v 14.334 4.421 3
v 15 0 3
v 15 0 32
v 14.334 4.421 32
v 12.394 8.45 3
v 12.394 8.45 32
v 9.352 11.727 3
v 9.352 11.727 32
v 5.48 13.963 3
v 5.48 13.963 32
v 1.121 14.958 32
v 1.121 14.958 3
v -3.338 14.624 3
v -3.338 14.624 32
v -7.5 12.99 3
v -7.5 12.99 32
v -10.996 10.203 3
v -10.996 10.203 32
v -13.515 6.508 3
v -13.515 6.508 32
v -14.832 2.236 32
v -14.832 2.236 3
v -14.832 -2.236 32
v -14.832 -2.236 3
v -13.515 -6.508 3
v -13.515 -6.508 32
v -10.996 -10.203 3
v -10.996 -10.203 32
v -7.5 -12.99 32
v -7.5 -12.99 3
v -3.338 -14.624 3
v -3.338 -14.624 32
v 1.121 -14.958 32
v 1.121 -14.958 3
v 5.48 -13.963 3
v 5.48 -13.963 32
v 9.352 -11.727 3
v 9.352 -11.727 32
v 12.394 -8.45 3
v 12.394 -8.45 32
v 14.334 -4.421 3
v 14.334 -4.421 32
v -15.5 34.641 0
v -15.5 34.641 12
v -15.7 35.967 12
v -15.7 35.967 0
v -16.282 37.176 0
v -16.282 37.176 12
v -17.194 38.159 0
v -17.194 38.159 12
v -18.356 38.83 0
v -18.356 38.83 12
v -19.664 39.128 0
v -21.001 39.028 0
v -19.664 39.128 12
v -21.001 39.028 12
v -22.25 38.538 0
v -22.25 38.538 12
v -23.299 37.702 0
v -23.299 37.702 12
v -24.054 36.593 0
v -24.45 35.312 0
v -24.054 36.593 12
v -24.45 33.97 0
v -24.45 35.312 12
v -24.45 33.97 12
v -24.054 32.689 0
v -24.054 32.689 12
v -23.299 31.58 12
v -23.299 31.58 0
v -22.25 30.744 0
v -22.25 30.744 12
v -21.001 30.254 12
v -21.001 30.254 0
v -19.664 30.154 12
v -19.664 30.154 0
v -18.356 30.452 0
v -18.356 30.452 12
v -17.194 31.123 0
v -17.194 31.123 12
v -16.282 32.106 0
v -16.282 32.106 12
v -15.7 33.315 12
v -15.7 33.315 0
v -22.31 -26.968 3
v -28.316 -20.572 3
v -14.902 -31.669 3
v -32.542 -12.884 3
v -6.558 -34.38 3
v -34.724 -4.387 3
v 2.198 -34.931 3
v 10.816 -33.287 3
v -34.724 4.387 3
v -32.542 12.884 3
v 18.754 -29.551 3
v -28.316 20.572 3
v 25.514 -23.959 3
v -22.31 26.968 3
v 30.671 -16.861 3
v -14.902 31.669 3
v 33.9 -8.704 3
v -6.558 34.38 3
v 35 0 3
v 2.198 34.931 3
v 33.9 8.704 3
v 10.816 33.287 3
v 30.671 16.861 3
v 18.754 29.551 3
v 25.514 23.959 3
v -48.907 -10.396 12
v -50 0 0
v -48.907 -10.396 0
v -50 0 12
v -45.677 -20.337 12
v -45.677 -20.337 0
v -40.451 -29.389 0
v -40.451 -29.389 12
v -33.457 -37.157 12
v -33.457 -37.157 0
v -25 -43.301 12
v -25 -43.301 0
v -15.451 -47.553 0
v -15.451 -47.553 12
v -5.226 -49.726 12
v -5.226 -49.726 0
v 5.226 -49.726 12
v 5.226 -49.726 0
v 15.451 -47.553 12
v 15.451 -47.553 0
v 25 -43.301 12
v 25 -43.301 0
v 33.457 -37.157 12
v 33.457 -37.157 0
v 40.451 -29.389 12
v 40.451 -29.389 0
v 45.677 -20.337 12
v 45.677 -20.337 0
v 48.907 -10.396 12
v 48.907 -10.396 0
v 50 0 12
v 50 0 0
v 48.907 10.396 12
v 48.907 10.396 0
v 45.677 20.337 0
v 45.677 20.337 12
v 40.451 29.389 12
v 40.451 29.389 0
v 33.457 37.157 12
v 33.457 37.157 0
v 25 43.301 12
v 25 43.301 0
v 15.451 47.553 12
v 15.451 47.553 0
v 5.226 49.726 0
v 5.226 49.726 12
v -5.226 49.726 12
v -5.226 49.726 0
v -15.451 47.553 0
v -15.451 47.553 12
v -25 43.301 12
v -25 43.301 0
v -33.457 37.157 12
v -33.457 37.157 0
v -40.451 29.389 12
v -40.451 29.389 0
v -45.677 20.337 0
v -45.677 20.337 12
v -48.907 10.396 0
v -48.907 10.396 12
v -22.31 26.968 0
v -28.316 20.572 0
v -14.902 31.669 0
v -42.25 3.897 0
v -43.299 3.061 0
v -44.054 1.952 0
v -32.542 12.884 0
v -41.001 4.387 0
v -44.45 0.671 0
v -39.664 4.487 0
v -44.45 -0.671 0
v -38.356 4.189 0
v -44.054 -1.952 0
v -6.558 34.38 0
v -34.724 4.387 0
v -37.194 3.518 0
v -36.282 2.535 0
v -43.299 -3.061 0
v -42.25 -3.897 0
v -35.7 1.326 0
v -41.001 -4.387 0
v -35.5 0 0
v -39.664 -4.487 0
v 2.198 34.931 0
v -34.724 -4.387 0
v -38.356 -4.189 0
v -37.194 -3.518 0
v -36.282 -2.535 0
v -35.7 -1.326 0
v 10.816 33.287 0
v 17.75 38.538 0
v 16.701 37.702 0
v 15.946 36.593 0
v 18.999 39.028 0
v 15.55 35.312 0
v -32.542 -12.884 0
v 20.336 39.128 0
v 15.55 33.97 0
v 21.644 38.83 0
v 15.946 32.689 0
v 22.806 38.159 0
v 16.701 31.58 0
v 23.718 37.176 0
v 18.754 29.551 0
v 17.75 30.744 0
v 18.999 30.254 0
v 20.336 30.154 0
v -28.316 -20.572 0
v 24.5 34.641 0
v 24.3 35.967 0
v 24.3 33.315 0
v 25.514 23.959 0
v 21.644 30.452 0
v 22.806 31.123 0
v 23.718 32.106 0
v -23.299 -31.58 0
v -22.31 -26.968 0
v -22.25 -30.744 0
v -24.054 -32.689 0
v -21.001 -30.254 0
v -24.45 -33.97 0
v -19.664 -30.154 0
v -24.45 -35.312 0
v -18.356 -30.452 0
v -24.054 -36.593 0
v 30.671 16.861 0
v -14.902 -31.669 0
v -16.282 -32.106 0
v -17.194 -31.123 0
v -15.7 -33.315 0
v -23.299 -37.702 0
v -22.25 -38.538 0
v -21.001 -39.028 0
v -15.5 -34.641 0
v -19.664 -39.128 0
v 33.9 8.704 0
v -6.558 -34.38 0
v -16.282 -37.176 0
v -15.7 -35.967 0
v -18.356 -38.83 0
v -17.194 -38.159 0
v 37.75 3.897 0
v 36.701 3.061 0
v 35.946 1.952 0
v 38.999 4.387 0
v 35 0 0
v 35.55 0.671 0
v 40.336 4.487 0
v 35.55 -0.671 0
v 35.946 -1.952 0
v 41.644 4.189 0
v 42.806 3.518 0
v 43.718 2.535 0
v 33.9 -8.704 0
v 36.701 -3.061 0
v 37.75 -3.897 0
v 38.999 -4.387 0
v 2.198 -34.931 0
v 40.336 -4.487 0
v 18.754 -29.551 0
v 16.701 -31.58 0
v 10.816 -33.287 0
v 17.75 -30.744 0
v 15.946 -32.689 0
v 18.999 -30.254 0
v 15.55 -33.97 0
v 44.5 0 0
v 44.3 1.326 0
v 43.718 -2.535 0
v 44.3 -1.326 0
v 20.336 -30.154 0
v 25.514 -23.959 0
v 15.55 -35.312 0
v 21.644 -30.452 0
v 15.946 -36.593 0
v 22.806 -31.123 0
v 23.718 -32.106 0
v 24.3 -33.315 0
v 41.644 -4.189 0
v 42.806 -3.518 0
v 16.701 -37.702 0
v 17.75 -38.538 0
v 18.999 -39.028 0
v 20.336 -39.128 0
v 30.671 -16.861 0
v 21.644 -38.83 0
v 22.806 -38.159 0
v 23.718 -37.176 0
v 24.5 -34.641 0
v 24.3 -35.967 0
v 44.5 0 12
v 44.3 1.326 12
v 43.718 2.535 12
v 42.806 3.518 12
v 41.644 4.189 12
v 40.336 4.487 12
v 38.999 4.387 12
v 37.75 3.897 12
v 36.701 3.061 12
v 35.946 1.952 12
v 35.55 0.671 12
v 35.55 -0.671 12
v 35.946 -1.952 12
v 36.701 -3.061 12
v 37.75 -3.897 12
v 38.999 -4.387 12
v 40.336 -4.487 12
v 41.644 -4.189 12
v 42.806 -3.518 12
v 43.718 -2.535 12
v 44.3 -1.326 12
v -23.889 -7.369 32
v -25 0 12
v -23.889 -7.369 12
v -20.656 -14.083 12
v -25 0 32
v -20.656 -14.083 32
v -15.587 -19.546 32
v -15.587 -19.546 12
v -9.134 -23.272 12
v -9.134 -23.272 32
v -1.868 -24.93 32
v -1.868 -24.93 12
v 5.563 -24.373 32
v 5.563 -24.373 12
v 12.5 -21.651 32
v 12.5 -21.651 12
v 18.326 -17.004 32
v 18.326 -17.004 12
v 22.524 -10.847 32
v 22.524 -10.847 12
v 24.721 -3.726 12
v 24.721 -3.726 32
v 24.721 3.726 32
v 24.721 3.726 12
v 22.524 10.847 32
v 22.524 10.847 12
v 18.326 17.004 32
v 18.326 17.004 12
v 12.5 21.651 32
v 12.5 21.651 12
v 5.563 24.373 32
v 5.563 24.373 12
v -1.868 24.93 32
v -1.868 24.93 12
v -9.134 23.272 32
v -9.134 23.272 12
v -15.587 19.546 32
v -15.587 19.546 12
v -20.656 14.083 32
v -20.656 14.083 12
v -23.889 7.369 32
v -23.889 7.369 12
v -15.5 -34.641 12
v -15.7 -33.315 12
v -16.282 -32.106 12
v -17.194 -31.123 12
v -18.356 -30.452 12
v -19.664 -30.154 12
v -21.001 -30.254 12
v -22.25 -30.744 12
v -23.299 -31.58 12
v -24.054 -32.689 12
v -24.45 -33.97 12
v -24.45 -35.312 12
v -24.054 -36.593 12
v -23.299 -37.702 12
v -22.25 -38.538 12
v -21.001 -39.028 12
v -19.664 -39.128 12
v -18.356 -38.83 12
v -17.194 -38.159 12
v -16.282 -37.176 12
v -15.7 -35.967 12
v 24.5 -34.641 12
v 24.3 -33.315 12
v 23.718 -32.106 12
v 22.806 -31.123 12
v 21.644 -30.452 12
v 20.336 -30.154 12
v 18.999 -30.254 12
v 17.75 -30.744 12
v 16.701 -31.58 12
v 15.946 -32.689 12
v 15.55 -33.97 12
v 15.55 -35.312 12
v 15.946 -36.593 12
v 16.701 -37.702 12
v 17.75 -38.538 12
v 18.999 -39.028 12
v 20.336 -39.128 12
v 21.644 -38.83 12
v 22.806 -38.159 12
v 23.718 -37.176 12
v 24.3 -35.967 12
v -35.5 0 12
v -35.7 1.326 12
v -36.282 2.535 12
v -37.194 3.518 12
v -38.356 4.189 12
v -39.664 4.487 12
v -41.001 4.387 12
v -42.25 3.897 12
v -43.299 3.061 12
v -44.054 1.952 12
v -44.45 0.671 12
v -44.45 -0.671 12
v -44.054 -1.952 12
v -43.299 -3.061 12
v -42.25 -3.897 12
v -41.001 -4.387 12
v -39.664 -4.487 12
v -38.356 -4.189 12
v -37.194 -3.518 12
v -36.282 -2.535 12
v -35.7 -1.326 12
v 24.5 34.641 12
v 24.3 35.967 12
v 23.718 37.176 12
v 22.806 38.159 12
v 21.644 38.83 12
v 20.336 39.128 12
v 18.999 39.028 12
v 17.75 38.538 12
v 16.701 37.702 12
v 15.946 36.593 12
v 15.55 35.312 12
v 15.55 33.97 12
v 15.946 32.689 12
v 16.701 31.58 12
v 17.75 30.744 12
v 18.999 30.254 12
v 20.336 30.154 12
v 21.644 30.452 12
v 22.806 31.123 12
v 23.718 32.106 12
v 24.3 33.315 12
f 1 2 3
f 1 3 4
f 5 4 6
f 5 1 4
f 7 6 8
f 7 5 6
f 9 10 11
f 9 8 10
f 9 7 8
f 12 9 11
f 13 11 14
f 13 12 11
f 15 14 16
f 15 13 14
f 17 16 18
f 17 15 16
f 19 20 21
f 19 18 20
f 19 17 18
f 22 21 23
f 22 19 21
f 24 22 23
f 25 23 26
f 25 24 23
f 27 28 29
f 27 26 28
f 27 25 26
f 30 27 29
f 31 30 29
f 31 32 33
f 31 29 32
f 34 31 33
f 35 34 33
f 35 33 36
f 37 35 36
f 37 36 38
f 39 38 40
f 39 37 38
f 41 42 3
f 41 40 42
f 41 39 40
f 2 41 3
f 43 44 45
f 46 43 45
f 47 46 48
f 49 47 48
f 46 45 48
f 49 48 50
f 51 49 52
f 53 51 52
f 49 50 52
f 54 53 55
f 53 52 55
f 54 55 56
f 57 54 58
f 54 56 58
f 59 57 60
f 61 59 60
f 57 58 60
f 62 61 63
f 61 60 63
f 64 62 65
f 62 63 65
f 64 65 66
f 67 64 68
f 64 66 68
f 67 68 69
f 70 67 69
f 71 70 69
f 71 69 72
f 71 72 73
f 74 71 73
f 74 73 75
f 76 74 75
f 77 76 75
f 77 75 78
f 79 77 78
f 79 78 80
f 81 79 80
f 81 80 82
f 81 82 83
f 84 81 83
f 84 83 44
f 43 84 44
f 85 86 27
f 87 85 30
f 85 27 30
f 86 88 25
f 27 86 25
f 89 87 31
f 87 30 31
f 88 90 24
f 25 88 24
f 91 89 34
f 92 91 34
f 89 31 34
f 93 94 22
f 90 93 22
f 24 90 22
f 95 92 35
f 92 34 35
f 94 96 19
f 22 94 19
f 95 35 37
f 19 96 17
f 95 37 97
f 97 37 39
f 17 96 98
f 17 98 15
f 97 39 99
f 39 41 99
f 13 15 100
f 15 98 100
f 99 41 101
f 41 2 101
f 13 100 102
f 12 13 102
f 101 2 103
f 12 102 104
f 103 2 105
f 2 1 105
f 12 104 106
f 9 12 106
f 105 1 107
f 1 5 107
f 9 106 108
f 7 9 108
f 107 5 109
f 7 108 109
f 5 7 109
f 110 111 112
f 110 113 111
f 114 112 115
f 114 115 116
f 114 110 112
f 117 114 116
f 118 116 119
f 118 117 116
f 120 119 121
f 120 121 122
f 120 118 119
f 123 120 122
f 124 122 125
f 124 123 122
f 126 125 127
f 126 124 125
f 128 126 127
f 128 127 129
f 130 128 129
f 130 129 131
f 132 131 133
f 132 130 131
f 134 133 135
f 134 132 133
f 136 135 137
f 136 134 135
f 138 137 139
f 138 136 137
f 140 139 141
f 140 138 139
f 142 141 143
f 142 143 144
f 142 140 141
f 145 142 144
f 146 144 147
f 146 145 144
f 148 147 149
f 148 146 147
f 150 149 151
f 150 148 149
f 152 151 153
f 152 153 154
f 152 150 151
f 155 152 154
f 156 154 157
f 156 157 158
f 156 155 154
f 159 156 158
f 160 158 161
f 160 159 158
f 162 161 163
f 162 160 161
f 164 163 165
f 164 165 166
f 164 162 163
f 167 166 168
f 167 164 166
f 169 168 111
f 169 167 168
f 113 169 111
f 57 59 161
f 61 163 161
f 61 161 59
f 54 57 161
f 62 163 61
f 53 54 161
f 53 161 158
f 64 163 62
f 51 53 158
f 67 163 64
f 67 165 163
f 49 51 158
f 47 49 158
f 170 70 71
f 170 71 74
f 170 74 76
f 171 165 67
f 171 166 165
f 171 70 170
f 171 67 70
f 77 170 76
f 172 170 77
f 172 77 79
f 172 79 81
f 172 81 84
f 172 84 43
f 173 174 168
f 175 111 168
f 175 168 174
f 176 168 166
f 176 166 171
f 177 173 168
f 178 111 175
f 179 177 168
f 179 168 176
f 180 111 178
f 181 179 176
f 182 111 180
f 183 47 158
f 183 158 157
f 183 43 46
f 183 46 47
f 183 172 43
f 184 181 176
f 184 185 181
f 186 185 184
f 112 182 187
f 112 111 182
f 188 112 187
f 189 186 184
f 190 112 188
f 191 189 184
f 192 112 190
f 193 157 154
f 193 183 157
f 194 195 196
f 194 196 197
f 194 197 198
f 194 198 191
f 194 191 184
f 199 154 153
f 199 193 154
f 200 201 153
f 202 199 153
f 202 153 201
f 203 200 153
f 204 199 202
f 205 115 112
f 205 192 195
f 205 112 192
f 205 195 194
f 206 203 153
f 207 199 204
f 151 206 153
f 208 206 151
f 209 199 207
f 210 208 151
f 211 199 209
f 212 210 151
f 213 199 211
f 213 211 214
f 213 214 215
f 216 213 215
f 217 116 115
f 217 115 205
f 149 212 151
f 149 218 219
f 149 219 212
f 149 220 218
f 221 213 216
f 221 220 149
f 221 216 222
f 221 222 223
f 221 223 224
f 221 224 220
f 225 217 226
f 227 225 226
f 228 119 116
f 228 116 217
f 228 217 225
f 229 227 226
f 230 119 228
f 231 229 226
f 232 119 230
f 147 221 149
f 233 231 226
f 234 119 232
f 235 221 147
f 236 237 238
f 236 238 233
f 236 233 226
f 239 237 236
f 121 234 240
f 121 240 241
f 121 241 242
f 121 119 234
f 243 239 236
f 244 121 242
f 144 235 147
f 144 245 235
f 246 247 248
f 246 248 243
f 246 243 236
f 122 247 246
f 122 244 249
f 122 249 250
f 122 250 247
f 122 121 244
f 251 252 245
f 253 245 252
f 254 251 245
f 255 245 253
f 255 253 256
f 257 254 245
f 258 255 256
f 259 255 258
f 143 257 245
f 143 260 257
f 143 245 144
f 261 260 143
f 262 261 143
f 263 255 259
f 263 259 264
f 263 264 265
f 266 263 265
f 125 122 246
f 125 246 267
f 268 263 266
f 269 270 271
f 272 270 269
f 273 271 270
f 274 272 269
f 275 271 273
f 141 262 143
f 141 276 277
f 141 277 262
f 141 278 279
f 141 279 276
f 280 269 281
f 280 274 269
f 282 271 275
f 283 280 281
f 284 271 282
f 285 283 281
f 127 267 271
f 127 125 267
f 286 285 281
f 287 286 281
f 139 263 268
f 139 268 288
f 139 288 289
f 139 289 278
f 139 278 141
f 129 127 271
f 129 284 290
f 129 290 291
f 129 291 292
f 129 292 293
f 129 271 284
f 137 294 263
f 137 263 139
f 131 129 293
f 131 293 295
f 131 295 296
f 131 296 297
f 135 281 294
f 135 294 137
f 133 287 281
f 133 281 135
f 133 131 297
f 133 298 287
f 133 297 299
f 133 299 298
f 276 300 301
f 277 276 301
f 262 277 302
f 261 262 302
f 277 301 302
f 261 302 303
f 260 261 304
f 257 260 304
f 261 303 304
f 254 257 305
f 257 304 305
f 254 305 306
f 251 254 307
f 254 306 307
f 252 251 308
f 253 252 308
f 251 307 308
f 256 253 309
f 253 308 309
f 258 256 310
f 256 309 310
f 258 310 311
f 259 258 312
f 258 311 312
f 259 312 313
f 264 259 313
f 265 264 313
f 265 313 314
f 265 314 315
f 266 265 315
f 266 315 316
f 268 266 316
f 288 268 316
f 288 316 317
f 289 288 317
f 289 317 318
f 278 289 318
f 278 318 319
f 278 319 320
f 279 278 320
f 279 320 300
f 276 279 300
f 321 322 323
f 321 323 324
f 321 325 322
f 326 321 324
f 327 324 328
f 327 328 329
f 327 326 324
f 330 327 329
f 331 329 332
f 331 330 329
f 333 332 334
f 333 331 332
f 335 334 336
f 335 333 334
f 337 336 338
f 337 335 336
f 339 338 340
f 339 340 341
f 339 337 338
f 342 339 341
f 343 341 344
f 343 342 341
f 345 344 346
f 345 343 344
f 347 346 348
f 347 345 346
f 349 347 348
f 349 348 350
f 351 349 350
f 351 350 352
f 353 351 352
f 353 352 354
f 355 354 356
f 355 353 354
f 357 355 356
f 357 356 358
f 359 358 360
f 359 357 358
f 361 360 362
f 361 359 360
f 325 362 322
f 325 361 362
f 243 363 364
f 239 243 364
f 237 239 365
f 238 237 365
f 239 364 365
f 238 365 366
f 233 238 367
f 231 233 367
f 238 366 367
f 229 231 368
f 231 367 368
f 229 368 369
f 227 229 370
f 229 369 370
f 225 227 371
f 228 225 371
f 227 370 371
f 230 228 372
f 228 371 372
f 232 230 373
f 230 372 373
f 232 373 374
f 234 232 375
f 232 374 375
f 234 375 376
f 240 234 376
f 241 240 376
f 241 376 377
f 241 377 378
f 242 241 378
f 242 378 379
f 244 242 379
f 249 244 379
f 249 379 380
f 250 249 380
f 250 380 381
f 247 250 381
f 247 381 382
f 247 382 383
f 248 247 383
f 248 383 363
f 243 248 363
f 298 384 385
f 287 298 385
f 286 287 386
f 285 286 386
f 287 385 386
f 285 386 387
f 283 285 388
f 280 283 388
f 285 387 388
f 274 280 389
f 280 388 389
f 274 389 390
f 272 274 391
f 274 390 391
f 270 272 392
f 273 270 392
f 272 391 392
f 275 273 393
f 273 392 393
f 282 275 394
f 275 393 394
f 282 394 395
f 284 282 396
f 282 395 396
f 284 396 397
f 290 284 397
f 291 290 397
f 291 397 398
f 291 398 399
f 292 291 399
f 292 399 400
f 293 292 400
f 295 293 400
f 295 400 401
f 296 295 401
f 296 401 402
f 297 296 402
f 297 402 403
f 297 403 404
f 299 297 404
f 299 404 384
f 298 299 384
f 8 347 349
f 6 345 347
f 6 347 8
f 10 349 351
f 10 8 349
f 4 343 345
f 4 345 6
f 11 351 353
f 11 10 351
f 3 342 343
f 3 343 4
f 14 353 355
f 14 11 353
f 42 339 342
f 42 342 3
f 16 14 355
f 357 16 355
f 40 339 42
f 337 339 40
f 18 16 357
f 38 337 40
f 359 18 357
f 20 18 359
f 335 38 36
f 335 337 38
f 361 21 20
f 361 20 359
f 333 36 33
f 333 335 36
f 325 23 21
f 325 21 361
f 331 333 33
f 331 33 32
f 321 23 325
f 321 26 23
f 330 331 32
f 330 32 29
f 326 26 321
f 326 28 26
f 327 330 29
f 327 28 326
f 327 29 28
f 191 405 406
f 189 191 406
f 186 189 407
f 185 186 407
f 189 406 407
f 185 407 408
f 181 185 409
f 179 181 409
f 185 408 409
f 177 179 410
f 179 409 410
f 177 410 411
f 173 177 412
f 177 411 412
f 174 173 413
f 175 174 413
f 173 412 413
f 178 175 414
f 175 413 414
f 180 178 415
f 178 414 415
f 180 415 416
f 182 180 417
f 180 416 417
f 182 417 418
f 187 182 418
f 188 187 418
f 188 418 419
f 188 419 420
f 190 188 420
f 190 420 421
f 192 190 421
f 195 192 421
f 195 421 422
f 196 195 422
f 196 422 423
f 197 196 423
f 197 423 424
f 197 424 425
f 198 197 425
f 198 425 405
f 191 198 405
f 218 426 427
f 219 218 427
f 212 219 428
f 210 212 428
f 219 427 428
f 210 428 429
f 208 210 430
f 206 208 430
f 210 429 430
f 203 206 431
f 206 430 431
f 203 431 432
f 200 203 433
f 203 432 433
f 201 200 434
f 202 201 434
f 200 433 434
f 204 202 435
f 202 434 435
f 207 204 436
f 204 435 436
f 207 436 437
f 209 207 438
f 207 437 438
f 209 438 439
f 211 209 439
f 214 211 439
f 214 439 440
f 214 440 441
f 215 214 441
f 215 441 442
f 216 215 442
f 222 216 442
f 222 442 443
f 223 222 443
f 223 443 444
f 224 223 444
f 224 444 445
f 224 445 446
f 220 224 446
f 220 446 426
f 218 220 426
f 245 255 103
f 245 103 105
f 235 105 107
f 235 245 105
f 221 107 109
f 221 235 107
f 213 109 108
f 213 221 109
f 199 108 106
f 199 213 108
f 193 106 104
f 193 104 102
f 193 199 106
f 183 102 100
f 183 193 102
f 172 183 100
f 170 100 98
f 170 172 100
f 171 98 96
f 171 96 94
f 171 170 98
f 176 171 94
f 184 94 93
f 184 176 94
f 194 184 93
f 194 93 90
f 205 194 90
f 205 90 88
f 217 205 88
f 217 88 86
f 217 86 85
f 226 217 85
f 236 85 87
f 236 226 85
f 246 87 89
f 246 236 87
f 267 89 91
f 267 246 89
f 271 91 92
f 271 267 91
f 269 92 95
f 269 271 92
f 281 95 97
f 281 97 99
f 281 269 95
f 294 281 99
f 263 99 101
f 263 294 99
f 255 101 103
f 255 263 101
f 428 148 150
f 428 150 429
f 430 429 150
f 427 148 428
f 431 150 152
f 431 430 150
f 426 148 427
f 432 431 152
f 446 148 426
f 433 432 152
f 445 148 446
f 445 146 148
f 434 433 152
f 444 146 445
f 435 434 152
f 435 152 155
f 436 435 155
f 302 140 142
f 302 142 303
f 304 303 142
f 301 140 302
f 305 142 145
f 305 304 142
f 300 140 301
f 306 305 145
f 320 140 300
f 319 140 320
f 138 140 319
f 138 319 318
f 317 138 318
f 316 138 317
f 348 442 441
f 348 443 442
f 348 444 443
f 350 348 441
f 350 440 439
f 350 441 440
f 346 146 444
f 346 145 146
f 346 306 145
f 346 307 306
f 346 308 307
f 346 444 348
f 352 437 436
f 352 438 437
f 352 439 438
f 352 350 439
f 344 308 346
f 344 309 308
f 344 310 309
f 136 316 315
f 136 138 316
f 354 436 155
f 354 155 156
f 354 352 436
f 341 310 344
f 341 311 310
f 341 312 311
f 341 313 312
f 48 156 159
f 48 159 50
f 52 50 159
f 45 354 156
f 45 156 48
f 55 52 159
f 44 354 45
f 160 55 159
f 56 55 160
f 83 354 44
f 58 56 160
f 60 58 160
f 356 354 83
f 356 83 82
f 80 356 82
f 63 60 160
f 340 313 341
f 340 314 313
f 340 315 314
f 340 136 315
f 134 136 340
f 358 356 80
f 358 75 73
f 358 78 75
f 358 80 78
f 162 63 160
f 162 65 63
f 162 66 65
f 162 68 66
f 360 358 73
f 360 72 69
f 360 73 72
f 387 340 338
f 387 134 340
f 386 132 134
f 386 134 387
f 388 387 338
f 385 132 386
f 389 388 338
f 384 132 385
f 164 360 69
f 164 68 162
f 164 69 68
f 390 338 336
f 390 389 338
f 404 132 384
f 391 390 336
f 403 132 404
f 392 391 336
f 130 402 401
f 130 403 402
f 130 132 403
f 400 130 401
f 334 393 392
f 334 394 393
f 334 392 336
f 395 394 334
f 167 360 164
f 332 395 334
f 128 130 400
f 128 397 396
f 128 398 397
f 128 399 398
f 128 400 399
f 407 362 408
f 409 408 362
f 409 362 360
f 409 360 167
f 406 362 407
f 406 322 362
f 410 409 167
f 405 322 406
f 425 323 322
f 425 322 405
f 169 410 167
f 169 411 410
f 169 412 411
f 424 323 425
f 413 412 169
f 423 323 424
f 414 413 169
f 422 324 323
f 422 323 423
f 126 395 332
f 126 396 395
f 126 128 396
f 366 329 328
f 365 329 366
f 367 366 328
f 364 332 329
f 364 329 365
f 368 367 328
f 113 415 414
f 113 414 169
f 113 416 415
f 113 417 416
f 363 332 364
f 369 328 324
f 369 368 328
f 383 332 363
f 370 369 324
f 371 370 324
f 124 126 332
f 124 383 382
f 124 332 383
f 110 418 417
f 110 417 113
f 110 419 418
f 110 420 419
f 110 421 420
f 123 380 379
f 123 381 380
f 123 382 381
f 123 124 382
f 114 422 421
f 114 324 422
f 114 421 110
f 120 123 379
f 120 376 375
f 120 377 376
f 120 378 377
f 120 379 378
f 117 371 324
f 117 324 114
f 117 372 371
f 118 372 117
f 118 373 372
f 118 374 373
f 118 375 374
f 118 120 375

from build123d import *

# Parameters (mm, degrees)
SKETCH_2_R          = 15
CUT_EXTRUDE_1_DEPTH = 78.614431648
SKETCH_3_R          = 35
CUT_EXTRUDE_2_DEPTH = 3
SKETCH_4_R          = 4.5
CUT_EXTRUDE_3_DEPTH = 78.614431648


with BuildPart() as part:
    # 草图1 → 旋转1 (revolve)
    with BuildSketch(Plane(origin=(0, 0, 0), x_dir=(1, 0, 0), z_dir=(0, 1, 0)), mode=Mode.PRIVATE) as revolve_1_sk:
        Polygon((0, 0), (50, 0), (50, -12), (25, -12), (25, -32), (0, -32), align=None)
    revolve(revolve_1_sk.sketch.rotate(Axis((0, 0, 0), (0, 0, 1)), 180), axis=Axis((0, 0, 0), (0, 0, 1)))

    # 草图2 → 切除-拉伸1 (cut, through all)
    with BuildSketch(Plane.XY):
        Circle(SKETCH_2_R)
    extrude(amount=CUT_EXTRUDE_1_DEPTH, mode=Mode.SUBTRACT)

    # 草图3 → 切除-拉伸2 (cut)
    with BuildSketch(Plane.XY):
        Circle(SKETCH_3_R)
    extrude(amount=CUT_EXTRUDE_2_DEPTH, mode=Mode.SUBTRACT)

    # 草图4 → 切除-拉伸3 (cut, through all)
    with BuildSketch(Plane.XY.offset(32)):
        with Locations((40, 0)):
            Circle(SKETCH_4_R)
        with Locations((20, 34.641016)):
            Circle(SKETCH_4_R)
        with Locations((-20, 34.641016)):
            Circle(SKETCH_4_R)
        with Locations((-40, 0)):
            Circle(SKETCH_4_R)
        with Locations((-20, -34.641016)):
            Circle(SKETCH_4_R)
        with Locations((20, -34.641016)):
            Circle(SKETCH_4_R)
    extrude(amount=-CUT_EXTRUDE_3_DEPTH, mode=Mode.SUBTRACT)


solid = part.part
